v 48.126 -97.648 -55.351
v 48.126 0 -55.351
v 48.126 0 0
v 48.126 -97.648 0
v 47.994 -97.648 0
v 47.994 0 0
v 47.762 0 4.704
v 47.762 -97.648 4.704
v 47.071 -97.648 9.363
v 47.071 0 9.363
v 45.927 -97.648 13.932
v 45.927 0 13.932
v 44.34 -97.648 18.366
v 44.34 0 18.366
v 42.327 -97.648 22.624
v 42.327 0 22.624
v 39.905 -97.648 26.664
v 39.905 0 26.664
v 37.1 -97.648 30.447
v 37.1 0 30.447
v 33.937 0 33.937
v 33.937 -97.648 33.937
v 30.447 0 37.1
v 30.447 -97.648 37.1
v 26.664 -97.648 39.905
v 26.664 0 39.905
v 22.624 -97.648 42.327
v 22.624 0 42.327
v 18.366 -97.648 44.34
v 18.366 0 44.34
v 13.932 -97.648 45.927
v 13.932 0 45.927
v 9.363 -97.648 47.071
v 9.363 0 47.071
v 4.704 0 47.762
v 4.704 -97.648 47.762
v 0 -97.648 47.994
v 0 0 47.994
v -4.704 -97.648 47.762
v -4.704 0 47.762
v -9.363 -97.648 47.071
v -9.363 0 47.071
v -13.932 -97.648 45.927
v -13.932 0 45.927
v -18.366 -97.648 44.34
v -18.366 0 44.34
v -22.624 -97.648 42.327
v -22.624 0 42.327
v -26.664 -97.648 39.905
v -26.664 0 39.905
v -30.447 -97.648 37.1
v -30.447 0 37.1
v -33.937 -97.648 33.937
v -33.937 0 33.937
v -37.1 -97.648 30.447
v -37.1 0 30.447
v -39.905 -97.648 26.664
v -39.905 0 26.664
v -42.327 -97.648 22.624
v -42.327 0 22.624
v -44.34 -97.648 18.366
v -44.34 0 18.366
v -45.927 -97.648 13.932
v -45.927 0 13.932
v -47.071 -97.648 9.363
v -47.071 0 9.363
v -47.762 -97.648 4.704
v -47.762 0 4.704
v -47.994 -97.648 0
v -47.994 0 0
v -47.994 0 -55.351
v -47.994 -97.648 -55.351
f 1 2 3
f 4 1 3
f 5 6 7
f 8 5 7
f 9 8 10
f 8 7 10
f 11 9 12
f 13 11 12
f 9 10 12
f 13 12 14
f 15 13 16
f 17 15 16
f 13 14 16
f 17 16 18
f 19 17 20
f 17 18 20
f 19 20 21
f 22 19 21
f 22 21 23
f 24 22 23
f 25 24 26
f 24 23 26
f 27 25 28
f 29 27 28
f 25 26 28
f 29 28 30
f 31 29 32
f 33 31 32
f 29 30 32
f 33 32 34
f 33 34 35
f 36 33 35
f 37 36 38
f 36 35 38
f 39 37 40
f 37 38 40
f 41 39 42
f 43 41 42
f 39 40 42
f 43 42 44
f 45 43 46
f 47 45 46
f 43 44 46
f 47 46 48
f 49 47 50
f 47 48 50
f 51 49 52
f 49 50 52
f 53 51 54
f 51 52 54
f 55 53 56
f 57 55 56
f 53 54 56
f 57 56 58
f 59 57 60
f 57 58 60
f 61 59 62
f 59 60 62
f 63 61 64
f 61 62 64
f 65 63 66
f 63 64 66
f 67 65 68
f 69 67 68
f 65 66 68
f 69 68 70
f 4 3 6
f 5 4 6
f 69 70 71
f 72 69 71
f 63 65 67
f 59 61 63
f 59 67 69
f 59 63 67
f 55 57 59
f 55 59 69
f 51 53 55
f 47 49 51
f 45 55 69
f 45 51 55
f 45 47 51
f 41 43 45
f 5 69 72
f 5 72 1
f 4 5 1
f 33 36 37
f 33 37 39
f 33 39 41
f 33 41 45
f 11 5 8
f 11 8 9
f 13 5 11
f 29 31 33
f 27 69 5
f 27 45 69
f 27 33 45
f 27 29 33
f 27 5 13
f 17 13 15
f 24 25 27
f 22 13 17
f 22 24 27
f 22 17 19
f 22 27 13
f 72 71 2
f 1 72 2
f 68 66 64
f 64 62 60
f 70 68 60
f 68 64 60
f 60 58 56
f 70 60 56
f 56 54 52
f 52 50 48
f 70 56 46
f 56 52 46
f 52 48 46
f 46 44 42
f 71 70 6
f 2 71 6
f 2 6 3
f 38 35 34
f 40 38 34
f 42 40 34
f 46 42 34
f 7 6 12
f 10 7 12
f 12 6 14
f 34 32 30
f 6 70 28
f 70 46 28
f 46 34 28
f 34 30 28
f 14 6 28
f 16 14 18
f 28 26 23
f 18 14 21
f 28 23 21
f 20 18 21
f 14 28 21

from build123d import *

# Parameters (mm, degrees)
F1_DEPTH = 97.6482406259


# Not quite as in the source:
# - the program builds the solid bodies; features that only make, move or delete a surface that nothing else refers to are left out


with BuildPart() as f1:
    # F0 (on Front) → F1 (new body)
    with BuildSketch(Plane.XZ):
        Polygon((47.9935407639, 0), (-47.9935407639, 0), (-47.9935407639, -55.3510189056), (48.1260120869, -55.3510189056), (48.1260120869, 0), align=None)
        with BuildLine():
            ThreePointArc((47.9935407639, 0), (0, 47.9935407639), (-47.9935407639, 0))
            Line((-47.9935407639, 0), (47.9935407639, 0))
        make_face()
    extrude(amount=F1_DEPTH)


solid = f1.part
